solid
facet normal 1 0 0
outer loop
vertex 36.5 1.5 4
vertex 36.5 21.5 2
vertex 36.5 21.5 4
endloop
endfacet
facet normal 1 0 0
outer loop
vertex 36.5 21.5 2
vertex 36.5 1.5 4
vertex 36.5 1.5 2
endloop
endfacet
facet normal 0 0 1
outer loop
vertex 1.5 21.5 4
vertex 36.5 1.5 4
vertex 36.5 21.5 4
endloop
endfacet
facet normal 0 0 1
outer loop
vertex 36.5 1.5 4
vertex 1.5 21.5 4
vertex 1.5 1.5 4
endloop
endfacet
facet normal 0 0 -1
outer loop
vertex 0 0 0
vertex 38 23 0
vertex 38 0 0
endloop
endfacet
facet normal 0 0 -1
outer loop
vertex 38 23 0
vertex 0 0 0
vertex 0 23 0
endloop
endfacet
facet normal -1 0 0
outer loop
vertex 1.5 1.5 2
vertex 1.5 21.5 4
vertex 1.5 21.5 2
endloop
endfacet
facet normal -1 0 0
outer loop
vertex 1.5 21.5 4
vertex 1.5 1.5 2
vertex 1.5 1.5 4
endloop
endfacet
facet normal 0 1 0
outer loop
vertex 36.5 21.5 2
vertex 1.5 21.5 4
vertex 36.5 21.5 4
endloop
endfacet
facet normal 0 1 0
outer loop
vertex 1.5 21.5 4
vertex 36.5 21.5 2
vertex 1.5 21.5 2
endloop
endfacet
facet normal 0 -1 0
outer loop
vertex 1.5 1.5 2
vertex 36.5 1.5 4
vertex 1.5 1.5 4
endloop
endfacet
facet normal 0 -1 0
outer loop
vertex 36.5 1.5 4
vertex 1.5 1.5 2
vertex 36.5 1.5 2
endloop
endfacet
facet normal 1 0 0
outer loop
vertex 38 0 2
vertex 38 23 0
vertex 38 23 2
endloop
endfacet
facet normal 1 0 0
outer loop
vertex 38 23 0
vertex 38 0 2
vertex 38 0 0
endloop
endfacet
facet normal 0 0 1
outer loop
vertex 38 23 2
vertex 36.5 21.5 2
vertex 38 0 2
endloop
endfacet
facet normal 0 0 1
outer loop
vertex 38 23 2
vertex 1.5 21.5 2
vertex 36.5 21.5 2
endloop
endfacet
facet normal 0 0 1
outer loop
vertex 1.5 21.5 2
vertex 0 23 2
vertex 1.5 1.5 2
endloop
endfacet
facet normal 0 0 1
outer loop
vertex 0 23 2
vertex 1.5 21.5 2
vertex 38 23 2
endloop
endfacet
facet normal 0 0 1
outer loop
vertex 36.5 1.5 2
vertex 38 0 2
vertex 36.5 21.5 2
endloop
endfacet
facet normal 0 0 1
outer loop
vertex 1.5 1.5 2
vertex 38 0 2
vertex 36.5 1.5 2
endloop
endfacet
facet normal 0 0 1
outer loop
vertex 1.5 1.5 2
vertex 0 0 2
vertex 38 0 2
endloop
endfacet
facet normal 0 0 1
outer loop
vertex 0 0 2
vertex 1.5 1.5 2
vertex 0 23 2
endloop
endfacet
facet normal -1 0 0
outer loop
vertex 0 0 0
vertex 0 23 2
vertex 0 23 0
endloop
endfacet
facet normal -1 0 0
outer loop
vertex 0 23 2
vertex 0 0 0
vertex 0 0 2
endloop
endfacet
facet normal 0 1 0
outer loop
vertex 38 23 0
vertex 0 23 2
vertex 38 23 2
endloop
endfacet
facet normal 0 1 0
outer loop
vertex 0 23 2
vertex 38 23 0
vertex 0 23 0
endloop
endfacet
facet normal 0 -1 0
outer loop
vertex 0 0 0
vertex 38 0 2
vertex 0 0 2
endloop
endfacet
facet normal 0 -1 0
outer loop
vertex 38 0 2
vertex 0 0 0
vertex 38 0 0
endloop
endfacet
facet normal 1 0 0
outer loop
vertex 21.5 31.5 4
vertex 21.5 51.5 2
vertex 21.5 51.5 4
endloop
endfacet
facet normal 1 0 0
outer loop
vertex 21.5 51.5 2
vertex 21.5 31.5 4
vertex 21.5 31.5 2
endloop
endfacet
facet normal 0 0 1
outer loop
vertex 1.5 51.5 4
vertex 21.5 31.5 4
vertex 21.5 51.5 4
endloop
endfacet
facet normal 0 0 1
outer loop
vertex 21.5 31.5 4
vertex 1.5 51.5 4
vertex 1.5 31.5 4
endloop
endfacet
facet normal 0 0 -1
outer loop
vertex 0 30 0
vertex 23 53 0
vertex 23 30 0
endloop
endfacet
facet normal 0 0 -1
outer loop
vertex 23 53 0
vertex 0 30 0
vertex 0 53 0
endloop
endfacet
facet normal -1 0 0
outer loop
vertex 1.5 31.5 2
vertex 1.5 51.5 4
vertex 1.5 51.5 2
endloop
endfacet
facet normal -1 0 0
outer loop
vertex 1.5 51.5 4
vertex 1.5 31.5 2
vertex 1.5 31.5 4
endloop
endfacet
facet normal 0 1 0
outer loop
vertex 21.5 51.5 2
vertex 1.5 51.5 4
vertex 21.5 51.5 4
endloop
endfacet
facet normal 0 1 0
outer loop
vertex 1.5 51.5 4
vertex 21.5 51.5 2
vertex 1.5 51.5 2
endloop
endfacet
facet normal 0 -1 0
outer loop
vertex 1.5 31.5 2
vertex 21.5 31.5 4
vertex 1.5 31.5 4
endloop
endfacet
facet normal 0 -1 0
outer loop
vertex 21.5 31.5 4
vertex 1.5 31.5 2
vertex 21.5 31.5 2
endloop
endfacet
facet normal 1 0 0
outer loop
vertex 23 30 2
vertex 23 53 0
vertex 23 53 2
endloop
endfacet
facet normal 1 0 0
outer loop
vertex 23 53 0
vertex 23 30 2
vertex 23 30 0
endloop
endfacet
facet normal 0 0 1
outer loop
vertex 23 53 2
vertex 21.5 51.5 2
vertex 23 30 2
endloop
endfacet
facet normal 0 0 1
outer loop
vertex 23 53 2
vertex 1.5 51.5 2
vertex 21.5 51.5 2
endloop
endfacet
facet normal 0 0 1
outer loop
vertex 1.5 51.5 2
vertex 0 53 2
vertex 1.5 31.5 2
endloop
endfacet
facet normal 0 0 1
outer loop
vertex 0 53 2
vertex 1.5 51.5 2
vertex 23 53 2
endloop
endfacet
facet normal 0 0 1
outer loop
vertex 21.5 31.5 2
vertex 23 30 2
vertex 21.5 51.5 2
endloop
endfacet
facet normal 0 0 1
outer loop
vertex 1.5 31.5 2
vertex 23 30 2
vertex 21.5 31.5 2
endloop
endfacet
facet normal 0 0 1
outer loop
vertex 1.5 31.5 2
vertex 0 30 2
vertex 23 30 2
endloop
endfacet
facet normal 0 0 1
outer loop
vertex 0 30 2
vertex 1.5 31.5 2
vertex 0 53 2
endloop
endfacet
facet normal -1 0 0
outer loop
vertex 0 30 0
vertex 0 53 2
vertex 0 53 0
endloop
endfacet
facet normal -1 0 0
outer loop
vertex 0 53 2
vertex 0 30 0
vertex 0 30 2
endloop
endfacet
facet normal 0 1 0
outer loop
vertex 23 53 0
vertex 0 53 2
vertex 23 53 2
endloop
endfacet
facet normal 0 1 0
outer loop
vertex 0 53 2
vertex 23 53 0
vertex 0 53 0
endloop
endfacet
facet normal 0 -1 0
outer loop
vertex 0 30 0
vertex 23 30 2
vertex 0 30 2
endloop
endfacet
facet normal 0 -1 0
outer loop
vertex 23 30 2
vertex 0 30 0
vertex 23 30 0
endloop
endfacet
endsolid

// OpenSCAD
module doorWindow()
{
translate([1.5,1.5,0]) cube([20,20,4]);
cube([23,23,2]);
}

module window()
{
translate([1.5,1.5,0]) cube([35,20,4]);
cube([38,23,2]);
}

window();

translate([0, 30,0]) doorWindow();
